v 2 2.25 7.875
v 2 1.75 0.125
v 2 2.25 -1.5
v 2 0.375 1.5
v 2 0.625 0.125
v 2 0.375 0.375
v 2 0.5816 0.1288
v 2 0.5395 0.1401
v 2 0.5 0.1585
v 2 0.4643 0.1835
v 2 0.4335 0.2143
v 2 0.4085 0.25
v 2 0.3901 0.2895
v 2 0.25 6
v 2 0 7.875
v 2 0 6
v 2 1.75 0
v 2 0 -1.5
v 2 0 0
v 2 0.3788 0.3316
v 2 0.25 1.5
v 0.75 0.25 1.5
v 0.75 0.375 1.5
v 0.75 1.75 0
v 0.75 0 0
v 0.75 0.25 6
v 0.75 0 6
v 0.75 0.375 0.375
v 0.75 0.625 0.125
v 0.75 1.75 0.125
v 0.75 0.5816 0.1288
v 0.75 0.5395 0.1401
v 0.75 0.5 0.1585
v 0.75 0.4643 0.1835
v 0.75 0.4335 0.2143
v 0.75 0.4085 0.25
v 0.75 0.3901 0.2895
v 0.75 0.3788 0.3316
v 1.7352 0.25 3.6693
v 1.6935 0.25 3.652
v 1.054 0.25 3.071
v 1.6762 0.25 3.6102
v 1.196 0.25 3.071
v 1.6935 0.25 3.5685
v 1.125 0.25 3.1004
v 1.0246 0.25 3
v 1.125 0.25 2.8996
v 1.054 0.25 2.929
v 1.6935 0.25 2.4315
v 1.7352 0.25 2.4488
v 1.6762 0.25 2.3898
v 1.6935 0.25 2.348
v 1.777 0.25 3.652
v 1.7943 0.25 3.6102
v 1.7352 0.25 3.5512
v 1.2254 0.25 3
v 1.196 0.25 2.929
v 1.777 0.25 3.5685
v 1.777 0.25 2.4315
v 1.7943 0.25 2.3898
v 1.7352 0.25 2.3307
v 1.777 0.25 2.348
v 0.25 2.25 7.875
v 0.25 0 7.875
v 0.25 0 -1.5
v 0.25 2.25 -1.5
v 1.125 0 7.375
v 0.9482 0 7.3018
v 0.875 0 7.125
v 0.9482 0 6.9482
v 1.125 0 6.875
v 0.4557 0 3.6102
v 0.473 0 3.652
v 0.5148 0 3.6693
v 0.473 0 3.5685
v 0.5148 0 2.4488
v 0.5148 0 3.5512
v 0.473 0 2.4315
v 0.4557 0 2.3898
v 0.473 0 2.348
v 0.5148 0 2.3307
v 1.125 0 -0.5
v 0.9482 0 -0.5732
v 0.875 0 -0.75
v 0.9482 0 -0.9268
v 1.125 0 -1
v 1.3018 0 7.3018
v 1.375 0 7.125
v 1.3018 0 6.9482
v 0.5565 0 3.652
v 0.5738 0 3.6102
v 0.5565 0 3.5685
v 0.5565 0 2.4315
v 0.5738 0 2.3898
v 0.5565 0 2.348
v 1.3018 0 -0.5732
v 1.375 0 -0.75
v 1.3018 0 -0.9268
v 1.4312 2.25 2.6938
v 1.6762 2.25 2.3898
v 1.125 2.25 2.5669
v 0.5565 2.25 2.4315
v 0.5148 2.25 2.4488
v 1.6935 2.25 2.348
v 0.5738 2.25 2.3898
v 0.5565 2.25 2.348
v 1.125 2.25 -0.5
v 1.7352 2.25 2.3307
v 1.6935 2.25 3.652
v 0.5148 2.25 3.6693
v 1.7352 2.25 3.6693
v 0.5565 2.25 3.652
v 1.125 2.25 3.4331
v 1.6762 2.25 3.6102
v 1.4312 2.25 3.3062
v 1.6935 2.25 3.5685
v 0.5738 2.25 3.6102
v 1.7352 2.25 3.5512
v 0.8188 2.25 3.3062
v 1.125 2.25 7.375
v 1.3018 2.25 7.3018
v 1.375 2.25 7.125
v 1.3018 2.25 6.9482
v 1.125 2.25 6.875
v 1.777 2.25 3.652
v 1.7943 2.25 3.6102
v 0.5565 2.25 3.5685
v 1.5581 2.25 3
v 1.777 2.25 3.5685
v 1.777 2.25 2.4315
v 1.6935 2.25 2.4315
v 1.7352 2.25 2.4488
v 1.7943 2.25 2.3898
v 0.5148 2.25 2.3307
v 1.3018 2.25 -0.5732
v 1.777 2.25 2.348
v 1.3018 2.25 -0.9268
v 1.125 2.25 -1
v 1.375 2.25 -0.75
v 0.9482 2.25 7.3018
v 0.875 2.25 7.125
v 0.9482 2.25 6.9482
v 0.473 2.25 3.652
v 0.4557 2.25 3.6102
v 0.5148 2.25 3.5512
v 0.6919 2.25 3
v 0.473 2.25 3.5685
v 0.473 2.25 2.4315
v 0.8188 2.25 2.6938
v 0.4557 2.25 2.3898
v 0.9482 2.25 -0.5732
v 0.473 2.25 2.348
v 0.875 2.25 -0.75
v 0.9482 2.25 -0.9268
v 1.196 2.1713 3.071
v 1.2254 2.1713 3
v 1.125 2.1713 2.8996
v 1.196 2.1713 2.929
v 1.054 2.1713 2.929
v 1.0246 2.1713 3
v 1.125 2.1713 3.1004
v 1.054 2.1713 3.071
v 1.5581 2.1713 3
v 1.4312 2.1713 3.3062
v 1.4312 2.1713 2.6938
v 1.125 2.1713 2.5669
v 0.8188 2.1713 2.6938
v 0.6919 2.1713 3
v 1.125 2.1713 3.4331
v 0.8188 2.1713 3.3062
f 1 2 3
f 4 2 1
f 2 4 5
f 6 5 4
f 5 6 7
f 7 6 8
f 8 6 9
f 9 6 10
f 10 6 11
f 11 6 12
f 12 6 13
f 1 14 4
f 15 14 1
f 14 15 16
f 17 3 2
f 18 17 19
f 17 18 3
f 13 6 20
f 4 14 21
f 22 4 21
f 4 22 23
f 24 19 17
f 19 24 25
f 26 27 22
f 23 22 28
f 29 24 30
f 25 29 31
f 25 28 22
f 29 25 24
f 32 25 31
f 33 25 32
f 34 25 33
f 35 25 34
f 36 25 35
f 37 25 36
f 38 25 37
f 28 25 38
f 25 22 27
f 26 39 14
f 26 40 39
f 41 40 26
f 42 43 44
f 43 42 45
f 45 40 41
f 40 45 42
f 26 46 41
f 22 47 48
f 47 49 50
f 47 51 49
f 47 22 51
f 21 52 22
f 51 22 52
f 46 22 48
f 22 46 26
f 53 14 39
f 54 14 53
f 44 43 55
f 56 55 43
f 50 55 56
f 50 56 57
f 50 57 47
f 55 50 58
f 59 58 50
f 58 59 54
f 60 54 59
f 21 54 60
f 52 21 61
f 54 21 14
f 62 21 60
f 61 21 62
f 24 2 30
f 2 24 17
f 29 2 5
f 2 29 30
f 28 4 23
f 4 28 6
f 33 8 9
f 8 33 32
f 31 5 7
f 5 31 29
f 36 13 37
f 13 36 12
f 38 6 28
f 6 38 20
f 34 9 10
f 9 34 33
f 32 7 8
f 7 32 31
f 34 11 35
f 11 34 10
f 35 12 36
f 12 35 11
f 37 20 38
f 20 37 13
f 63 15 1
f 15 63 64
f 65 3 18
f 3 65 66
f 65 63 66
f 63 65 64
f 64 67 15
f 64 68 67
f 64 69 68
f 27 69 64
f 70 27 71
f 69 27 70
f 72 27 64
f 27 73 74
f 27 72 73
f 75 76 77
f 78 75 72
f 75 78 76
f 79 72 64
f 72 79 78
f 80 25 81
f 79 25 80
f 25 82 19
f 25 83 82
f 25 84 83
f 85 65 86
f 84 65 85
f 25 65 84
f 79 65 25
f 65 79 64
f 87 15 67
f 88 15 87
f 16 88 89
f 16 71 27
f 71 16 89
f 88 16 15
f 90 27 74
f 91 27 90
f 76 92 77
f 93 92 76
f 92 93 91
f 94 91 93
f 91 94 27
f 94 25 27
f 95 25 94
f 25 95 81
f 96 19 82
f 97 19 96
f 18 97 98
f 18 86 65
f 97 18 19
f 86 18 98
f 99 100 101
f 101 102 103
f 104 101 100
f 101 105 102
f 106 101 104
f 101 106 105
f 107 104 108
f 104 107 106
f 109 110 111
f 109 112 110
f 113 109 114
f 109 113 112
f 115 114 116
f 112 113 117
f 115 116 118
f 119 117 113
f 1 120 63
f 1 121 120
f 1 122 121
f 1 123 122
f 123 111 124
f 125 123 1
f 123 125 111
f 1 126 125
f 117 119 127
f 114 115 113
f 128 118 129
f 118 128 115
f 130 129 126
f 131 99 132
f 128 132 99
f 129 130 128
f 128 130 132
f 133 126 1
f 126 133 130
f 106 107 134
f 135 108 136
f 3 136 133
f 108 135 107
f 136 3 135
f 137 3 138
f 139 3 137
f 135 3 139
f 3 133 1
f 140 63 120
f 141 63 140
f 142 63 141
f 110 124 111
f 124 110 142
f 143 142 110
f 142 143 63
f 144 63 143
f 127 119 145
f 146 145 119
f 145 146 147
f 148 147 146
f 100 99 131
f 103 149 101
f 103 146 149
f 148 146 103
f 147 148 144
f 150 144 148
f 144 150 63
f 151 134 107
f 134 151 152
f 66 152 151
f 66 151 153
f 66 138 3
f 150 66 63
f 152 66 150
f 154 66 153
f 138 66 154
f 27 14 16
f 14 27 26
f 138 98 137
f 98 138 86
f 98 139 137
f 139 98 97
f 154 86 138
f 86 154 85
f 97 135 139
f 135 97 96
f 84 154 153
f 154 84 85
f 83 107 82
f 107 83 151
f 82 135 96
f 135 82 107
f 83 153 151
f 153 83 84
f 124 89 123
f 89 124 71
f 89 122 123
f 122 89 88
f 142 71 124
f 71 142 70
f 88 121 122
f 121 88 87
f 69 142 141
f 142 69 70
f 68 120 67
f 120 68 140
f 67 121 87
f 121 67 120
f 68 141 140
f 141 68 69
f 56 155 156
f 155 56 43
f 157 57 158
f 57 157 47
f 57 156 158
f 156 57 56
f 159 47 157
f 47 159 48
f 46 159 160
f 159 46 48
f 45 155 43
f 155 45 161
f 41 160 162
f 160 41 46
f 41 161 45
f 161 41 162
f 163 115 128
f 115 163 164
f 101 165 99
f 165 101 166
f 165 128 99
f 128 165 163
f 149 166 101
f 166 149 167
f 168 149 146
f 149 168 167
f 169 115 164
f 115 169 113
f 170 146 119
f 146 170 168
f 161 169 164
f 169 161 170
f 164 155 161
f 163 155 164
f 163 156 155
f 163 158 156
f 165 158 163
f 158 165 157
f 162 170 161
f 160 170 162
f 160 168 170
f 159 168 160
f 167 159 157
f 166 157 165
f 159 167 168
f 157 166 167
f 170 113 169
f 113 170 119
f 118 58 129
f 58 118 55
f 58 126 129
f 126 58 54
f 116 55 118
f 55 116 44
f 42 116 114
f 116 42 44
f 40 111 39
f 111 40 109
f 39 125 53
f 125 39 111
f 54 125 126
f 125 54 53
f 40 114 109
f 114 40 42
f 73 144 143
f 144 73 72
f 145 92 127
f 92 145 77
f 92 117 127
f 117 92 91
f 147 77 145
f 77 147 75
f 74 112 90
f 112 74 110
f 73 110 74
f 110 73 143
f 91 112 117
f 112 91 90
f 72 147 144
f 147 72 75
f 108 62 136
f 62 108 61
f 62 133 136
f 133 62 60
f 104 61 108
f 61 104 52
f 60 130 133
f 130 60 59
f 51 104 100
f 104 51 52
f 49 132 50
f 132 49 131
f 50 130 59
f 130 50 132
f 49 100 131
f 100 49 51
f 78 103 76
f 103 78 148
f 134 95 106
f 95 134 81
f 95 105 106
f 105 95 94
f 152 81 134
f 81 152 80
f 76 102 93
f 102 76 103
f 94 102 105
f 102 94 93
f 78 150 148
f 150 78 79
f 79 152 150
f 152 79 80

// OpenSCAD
// file: TTvars.scad
$fn=8; //default 36

barX=0.25;
barZ=6;
barLY=108;
barLX=60;

angX=1.5;
angT=0.125;
angLY=barLY;
angLX=barLX;
angR=0.25;

boltD=0.5;   // 6mm
boltL=1.968504;    // 50mm

brrOD=0.875;
brrID=0.375;
brrT=0.28125;

sprOD=0.25;

bmountGap=0.125;
bmountbrrGap=0.125;

stepBoltD=0.11811024;  //3.0mm bolt diameter
stepBoltHD=0.22362205; //5.68mm head diameter
stepBoltHH=0.11811024;  //3.0mm head height
stepBoltX=1.22047244;   //31.0mm square from bolt center to center
stepBoltIn=0.15748031;  //4.0mm bolt depth into stepper
stepSeatD=0.86614173;    //22.0mm
stepSeatH=0.07874016;    //2.0mm
stepX=1.66535433;        //42.3mm stepper square face 
stepBoreD=0.2007874;     //5.1mm shaft bore
stepBoreL=0.94488189;    //24mm

pullP=1.253;       //OD of belt around pully GT2 20T ??
pullH=0;            //Height of pulley


//calculated

Y2Y=barLX+0.0;
Y2YA=Y2Y+(((((barX+(bmountGap*2)))/2)+0.5)*2); //center to center barL
X2X=8; //distance between X rails

bmountX=barX+((brrOD+1)*2);
bmountY=X2X;
bmountZ=barZ+(1+boltD)+(brrOD/2)+(brrID/2)+(0.25)+boltD+(0.5);
// main file
include <TTvars.scad>;

TTx2mount();

//need to add stepper motor mounting holes or idler


module TTx2mount(){
mirror([0,1,0]){    
difference(){    
translate([(barX+(bmountGap*2))/2,-(angX+0.75),-(1+boltD)])
cube([((bmountX-(barX+(bmountGap*2)))/2),angX+0.75,bmountZ]);    
//main flat bar cutout
    translate([(((barX+(bmountGap*2)))/2)+0.5,-barX,0])
cube([((bmountX-(barX+(bmountGap*2)))/2)-0.5,barX,barZ]);

translate([(((barX+(bmountGap*2)))/2)+0.5,-barX-angX,0])
difference(){
    cube([((bmountX-(barX+(bmountGap*2)))/2)-0.5,angX,angX]);
    translate([0,-angT,angT])
    cube([((bmountX-(barX+(bmountGap*2)))/2)-0.5,angX,angX]);
}


translate([(((barX+(bmountGap*2)))/2)+0.5,-barX-angX,0])
translate([0,angX-angR-angT,angT])
difference(){
cube([((bmountX-(barX+(bmountGap*2)))/2)-0.5,angR,angR]);
    translate([0,0,angR])
    rotate([0,90,0])
    cylinder(r=angR,h=((bmountX-(barX+(bmountGap*2)))/2)-0.5,$fn=36);

} //end difference    

translate([bmountX-(((bmountX-(barX+(bmountGap*2)))/2)/2)-(bmountX/2),-(angX+0.75),-(1+boltD)/2])
rotate([-90,0,0])
    cylinder(d=boltD, h=(angX+0.75));
translate([bmountX-(((bmountX-(barX+(bmountGap*2)))/2)/2)-(bmountX/2),-(angX+0.75),barZ+(brrOD/2)+(brrID/2)+(0.25)+(boltD/2)])
rotate([-90,0,0])
    cylinder(d=boltD, h=(angX+0.75));
    
//stepper

//bore
translate([bmountX-(((bmountX-(barX+(bmountGap*2)))/2)/2)-(bmountX/2),-(angX+0.75),barZ/2])
rotate([270,0,0])
cylinder(d=stepBoreD,h=angX+0.75);

//translate([bmountX-(((bmountX-(barX+(bmountGap*2)))/2)/2)-(bmountX/2),-(angX+0.75),barZ/2])
//rotate([270,0,0])
//cylinder(d=pullP,h=angX+0.75);

translate([bmountX-(((bmountX-(barX+(bmountGap*2)))/2)/2)-(bmountX/2),-(angX+0.75),barZ/2])
rotate([270,0,0])
cylinder(d=stepSeatD,h=stepSeatH);

translate([bmountX-(((bmountX-(barX+(bmountGap*2)))/2)/2)-(bmountX/2)+(stepBoltX/2),-(angX+0.75),(barZ/2)+(stepBoltX/2)])
rotate([270,0,0])
cylinder(d=stepBoltD,h=angX+0.75);
translate([bmountX-(((bmountX-(barX+(bmountGap*2)))/2)/2)-(bmountX/2)-(stepBoltX/2),-(angX+0.75),(barZ/2)+(stepBoltX/2)])
rotate([270,0,0])
cylinder(d=stepBoltD,h=angX+0.75);
translate([bmountX-(((bmountX-(barX+(bmountGap*2)))/2)/2)-(bmountX/2)+(stepBoltX/2),-(angX+0.75),(barZ/2)-(stepBoltX/2)])
rotate([270,0,0])
cylinder(d=stepBoltD,h=angX+0.75);
translate([bmountX-(((bmountX-(barX+(bmountGap*2)))/2)/2)-(bmountX/2)-(stepBoltX/2),-(angX+0.75),(barZ/2)-(stepBoltX/2)])
rotate([270,0,0])
cylinder(d=stepBoltD,h=angX+0.75);


} //end difference
} //end main mirror
} //end TTxmount
